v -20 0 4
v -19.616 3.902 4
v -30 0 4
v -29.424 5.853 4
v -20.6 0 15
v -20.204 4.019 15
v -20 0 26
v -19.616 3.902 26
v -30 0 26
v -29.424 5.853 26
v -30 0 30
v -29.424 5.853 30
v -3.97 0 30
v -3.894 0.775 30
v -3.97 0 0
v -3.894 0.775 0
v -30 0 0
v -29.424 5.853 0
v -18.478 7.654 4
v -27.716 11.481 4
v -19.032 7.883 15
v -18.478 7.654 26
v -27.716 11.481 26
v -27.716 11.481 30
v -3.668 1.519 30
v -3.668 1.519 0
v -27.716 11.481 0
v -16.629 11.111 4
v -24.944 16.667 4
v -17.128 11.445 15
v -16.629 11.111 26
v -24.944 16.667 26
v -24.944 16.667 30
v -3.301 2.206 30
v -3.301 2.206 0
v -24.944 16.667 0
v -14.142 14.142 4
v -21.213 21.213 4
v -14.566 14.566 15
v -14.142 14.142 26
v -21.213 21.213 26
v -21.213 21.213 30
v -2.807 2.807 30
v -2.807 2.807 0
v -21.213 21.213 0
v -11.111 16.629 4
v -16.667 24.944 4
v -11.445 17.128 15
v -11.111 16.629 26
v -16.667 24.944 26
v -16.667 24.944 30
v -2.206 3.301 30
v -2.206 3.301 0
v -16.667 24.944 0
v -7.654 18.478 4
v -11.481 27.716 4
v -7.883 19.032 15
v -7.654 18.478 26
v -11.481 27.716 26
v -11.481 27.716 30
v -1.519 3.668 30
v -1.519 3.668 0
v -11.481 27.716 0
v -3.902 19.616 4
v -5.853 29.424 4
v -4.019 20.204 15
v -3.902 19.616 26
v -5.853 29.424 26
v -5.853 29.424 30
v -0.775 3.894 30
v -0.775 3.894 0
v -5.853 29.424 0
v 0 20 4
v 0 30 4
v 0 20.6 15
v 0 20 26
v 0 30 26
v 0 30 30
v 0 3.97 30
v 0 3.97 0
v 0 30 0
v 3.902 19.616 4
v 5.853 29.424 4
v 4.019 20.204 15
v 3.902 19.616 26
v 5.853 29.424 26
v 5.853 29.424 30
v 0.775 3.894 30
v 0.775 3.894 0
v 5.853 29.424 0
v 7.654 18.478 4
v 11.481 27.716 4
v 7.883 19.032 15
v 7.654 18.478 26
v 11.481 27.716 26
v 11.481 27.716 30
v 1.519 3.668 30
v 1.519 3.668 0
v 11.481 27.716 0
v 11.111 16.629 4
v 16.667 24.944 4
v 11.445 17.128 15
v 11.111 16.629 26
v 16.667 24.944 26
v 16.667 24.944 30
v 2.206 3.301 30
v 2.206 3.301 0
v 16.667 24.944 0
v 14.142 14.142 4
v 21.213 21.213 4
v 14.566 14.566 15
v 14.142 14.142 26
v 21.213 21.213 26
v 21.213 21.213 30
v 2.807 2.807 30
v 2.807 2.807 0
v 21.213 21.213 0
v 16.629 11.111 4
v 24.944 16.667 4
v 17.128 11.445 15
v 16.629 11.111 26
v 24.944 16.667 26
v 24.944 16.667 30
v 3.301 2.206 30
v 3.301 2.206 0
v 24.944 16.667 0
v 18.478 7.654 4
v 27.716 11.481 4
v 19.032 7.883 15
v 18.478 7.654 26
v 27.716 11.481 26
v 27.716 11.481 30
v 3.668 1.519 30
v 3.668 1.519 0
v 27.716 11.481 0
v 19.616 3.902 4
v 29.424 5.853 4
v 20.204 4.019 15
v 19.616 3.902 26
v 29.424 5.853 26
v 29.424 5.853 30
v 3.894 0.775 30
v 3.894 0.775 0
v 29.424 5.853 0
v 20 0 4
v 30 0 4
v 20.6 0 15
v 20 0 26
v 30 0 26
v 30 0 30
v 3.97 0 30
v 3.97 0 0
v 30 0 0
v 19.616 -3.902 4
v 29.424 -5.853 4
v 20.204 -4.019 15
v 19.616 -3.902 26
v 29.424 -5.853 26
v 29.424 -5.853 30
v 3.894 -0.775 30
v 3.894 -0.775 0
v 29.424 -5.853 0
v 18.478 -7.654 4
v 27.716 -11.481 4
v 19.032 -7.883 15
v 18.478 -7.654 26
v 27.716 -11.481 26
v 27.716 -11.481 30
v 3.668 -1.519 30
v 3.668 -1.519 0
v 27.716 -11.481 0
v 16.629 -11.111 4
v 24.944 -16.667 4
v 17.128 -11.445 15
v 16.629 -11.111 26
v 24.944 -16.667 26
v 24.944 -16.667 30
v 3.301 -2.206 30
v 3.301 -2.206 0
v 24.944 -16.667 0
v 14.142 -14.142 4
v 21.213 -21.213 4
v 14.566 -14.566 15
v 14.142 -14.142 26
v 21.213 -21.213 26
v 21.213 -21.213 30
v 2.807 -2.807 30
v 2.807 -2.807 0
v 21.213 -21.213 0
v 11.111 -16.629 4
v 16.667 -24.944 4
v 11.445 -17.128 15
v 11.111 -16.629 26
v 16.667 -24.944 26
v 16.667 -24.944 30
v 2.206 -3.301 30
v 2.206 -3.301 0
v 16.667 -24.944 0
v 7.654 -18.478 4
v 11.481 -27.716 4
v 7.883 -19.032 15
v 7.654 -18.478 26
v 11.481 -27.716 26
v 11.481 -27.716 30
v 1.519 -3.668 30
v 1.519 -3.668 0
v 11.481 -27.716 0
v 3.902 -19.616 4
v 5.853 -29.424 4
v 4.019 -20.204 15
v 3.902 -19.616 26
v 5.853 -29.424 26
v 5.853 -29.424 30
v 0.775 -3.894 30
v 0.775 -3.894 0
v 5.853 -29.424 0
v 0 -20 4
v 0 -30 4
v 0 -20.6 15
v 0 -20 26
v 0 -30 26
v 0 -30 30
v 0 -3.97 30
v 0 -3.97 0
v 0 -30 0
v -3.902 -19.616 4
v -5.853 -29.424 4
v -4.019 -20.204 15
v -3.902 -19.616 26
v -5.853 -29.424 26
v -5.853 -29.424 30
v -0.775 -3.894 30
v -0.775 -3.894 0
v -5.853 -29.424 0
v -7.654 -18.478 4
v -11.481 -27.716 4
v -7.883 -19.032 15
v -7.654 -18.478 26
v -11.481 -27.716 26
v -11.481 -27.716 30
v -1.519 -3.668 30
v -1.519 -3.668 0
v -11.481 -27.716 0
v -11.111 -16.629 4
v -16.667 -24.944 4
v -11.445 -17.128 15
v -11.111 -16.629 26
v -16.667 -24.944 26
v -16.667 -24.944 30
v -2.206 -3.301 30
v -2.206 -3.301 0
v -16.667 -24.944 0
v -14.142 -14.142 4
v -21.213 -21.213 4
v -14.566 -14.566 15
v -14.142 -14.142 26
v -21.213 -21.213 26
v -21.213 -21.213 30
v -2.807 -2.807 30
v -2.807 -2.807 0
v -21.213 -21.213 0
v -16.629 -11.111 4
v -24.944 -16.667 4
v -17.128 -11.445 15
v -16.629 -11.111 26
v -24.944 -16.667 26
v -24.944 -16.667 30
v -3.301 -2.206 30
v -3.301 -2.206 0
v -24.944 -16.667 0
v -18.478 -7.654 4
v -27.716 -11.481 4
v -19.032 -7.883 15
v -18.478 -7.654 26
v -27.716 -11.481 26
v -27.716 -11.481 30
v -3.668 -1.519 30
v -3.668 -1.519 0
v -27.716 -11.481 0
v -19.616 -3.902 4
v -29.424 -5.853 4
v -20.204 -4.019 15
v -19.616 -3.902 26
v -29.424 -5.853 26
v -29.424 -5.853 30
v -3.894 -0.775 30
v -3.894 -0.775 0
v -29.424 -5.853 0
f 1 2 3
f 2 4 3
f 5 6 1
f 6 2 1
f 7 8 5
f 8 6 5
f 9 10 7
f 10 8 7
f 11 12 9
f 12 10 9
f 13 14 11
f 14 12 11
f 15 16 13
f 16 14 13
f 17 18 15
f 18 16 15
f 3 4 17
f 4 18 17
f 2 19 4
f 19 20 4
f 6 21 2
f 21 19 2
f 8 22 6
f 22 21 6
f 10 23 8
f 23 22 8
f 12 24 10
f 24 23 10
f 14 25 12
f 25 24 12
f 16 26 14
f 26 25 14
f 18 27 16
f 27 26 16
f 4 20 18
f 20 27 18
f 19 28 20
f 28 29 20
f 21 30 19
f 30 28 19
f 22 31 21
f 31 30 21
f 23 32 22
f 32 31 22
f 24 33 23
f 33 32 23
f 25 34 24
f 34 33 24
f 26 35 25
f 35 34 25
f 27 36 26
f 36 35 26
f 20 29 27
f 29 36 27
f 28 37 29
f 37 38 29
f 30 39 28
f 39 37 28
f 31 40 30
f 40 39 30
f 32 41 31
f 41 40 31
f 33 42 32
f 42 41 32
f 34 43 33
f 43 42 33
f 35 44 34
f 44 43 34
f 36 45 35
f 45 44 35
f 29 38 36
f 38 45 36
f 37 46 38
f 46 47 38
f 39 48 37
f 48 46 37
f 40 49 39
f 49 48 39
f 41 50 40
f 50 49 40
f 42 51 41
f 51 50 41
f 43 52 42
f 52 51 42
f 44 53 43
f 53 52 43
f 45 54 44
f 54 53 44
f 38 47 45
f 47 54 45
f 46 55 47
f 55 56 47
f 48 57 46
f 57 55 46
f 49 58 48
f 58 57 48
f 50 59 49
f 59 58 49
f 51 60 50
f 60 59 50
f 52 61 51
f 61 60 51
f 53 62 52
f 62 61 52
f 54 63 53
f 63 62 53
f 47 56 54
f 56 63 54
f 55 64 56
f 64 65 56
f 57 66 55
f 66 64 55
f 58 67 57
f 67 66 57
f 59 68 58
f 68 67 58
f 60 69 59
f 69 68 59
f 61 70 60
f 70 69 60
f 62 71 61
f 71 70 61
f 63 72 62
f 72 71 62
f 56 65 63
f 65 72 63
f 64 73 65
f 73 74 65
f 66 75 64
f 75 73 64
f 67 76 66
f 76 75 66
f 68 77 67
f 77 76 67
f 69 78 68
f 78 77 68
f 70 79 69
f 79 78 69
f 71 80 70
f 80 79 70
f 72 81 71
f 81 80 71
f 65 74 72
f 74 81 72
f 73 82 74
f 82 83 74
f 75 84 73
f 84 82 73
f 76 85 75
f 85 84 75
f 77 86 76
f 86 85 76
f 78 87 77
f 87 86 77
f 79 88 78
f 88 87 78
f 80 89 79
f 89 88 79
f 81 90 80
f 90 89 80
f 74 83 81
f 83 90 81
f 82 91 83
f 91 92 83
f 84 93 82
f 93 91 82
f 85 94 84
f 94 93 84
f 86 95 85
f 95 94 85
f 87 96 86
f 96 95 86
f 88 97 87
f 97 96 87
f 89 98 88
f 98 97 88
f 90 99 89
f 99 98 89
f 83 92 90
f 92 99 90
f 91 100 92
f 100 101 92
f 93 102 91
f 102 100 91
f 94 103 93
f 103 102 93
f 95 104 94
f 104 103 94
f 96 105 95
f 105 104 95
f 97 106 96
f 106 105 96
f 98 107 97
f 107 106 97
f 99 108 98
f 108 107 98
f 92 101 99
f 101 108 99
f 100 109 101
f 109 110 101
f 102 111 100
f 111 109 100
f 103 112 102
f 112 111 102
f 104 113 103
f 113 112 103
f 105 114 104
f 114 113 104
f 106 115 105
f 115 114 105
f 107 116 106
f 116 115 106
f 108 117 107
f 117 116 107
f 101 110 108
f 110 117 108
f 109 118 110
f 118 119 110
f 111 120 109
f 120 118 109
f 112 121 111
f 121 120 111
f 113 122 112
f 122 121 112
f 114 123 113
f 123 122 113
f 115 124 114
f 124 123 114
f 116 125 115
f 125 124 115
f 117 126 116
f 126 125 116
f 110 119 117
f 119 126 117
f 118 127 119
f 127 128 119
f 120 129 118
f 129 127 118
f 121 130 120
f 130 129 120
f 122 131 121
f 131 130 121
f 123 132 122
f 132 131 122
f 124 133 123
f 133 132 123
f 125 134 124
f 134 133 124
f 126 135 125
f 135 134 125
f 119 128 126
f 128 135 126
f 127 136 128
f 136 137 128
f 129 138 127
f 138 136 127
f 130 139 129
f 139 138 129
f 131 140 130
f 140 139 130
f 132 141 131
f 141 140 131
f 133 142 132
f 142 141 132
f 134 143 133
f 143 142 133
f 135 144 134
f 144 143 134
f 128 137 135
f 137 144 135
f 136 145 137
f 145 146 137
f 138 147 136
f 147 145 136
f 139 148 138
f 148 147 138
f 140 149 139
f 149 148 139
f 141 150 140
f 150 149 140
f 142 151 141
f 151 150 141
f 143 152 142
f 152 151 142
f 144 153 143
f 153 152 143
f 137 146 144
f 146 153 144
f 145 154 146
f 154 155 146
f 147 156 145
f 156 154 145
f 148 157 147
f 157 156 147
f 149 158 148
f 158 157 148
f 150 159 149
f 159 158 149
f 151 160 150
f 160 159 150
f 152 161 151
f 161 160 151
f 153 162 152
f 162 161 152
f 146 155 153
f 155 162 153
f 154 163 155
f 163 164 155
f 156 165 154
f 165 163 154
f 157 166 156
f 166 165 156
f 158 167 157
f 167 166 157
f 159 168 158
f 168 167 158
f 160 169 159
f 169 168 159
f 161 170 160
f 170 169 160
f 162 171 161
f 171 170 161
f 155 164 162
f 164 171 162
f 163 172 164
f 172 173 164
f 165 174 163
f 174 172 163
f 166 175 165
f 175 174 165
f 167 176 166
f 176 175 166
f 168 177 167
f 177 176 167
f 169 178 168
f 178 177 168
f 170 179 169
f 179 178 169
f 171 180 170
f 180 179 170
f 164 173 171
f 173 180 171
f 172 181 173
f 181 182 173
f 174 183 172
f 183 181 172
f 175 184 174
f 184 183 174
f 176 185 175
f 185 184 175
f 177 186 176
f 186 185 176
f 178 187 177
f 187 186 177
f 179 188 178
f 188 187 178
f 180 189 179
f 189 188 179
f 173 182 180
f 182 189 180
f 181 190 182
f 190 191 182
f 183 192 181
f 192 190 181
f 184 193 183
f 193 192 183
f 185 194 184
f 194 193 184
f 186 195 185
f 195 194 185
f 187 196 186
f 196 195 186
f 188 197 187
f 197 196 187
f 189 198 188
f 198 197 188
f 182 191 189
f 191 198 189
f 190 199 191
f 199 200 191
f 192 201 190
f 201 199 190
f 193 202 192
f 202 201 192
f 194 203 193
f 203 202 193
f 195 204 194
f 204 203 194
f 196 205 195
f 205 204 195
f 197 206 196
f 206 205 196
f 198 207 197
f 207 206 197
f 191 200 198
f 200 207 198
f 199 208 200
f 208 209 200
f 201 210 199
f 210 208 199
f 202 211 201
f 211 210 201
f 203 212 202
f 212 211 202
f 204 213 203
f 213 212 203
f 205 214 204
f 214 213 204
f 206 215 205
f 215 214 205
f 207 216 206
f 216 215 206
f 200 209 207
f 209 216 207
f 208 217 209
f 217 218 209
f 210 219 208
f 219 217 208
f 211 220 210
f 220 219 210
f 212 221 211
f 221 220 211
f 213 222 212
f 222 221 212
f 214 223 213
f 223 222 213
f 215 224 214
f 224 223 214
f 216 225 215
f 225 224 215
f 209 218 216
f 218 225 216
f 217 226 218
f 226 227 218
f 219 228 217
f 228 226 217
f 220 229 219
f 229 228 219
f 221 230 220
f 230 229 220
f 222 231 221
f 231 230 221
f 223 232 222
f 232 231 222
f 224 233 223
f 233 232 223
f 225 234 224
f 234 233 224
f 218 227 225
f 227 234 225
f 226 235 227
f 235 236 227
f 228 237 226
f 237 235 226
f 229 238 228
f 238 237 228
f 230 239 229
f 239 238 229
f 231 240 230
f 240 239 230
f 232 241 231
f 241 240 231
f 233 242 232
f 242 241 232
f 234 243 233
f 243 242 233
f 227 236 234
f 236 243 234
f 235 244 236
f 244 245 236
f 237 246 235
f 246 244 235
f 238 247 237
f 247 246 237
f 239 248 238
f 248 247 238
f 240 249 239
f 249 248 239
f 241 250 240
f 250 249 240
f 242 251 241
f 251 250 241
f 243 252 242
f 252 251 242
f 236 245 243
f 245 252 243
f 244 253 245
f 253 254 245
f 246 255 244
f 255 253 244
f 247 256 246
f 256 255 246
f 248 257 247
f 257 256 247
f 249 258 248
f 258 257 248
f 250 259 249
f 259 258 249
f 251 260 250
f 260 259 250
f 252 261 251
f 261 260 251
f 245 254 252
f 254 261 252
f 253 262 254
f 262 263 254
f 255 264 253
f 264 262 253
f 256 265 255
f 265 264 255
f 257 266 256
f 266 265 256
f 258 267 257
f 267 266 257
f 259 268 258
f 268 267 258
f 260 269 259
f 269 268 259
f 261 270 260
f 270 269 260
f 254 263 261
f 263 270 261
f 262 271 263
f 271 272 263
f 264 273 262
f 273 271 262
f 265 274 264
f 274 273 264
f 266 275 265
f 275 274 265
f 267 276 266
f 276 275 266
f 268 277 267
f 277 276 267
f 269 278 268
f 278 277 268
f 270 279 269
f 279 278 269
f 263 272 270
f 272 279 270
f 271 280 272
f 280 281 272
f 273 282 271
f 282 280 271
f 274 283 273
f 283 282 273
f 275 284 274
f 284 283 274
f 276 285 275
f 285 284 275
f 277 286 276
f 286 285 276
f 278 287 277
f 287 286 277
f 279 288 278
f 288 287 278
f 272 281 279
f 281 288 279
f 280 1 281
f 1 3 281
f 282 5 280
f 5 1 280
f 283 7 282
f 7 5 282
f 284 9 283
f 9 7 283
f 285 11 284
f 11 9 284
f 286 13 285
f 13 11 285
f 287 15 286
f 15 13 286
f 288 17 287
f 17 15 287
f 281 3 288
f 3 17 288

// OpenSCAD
$fn = 32;

// ----------------------------------------------------------------------
// Belt roller: 40 mm barrel, 30 mm wide, bore 7.94 mm
// ----------------------------------------------------------------------

// --- parameters (mm) ---
bore_d = 7.94;            // bore
barrel_d = 40;            // barrel diameter
roller_w = 30;            // roller width
flange_d = 60;            // flange diameter
flange_t = 4;             // flange thickness
hub_d = 27.94;            // hub diameter

roller_profile = [[3.97, 0], [30, 0], [30, 4], [20, 4], [20.6, 15], [20, 26], [30, 26], [30, 30], [3.97, 30]];

/* the profile stays clear of the axis, so the bore comes out of the revolve */
rotate_extrude() polygon(roller_profile);
